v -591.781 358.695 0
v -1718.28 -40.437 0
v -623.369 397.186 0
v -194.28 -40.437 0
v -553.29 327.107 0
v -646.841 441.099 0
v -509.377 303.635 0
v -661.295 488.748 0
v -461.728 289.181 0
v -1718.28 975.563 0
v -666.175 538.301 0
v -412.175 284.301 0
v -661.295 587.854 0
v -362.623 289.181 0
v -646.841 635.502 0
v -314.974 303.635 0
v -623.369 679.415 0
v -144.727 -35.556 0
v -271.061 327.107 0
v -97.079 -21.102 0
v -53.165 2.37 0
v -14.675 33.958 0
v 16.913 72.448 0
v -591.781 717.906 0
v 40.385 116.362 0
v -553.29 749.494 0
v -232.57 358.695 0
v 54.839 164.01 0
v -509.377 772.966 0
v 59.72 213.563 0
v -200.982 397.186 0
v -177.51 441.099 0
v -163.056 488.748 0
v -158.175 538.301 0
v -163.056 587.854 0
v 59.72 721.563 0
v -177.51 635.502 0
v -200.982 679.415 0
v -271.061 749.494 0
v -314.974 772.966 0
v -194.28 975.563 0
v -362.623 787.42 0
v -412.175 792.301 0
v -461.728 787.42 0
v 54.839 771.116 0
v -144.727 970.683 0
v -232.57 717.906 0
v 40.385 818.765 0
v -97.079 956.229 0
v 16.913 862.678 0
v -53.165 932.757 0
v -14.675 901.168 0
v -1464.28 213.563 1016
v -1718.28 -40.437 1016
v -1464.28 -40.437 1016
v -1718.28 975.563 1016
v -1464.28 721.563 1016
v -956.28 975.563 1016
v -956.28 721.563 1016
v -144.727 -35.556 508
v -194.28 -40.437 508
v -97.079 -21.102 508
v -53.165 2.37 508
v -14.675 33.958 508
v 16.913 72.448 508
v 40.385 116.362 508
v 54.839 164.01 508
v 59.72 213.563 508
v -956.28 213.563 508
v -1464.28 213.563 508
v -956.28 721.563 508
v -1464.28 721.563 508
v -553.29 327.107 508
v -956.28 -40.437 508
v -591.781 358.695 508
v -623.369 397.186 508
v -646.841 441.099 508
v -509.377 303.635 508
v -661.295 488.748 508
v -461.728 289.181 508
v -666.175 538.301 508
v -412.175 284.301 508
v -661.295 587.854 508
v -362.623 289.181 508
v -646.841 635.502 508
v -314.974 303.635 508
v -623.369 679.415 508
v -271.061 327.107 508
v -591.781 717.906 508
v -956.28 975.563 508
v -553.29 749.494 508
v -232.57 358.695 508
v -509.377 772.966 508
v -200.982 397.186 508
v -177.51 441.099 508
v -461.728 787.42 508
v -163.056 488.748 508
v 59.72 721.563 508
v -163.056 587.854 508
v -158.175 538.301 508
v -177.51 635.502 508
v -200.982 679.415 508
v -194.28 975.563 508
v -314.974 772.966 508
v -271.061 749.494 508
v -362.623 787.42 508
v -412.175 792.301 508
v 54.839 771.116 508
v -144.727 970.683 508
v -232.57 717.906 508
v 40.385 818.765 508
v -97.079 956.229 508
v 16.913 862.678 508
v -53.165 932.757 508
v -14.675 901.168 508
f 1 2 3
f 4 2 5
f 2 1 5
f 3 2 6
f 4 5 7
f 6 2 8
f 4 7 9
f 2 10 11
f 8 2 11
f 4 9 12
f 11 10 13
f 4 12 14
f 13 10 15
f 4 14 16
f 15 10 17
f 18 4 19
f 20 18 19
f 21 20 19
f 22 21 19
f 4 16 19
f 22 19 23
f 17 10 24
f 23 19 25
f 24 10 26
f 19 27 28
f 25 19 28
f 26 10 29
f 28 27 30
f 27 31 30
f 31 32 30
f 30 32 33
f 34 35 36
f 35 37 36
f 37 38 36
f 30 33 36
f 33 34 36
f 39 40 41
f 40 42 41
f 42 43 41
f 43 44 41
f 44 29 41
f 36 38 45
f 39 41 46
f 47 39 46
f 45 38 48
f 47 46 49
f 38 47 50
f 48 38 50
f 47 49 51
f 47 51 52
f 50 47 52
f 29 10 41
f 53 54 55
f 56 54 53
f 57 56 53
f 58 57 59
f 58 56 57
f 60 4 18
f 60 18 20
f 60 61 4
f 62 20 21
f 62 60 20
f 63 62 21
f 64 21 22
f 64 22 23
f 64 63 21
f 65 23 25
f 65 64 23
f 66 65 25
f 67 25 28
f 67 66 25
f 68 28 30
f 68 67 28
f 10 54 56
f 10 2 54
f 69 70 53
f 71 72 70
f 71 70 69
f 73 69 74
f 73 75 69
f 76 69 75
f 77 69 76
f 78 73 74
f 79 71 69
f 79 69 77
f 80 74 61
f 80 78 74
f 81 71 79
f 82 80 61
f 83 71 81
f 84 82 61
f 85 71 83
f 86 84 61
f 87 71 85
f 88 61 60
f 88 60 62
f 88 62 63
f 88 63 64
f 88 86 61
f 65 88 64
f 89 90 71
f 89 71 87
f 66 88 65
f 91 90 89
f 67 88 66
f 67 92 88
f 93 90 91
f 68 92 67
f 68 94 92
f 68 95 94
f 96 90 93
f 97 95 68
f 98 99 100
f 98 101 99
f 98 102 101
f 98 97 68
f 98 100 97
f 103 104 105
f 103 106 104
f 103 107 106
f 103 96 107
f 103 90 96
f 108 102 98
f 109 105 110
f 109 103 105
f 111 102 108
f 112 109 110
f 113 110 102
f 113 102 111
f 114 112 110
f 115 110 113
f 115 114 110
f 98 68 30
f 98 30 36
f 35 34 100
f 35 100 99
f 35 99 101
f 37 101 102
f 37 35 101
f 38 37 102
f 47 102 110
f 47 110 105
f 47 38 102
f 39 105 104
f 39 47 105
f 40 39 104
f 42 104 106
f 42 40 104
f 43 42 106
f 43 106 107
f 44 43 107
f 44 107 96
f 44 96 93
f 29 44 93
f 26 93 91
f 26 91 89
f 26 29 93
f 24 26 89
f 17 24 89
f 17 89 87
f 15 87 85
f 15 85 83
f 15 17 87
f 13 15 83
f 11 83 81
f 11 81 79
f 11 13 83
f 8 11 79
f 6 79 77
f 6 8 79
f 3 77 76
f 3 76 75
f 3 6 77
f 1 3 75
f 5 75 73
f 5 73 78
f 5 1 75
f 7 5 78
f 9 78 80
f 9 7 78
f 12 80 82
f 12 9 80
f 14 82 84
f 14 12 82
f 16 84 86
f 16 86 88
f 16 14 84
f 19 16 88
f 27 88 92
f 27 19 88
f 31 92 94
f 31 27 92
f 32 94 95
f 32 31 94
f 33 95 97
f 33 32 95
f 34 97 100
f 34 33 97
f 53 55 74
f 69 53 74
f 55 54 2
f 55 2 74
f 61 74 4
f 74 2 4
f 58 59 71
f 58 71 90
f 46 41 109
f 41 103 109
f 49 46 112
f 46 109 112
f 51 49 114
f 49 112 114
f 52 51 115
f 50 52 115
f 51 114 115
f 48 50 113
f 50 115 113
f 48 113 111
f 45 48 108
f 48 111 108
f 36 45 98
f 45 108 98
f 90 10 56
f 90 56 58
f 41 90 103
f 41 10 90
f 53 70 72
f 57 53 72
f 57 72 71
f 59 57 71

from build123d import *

# Parameters (mm, degrees)
F0_W      = 1778
F0_H      = 1016
F0_R      = 254
F1_DEPTH  = 508
F2_R      = 254
F3_W      = 254
F3_H      = 1016
F4_DEPTH  = 508
F5_W      = 508
F5_H      = 254
F6_DEPTH  = 508
F7_W      = 508
F7_H      = 254
F8_DEPTH  = 508
F10_DEPTH = 254


with BuildPart() as f1:
    # F0 (on Top) → F1 (new body)
    with BuildSketch(Plane.XY):
        with Locations((-829.280311, 467.563289)):
            Rectangle(F0_W, F0_H)
        with Locations((-412.175477, 538.300574)):
            Circle(F0_R, mode=Mode.SUBTRACT)
    extrude(amount=F1_DEPTH)

    # F2
    f2_edges = [f1.edges().sort_by_distance(p)[0] for p in [
        (59.719689, -40.436711, 254),
        (59.719689, 975.563289, 254),
    ]]
    fillet(f2_edges, radius=F2_R)

    # F3 (on face) → F4 (join)
    with BuildSketch(Plane.XY.offset(508)):
        with Locations((-1591.280311, 467.563289)):
            Rectangle(F3_W, F3_H)
    extrude(amount=F4_DEPTH)

    # F5 (on face) → F6 (join)
    with BuildSketch(Plane.XY.offset(508)):
        with Locations((-1210.280311, 848.563289)):
            Rectangle(F5_W, F5_H)
    extrude(amount=F6_DEPTH)

    # F7 (on face) → F8 (join)
    with BuildSketch(Plane.XY.offset(508)):
        with Locations((-1210.280311, 86.563289)):
            Rectangle(F7_W, F7_H)
    extrude(amount=F8_DEPTH)

    # F9 (on face) → F10 (cut)
    with BuildSketch(Plane.XZ.offset(40.436711)):
        Polygon((-1464.280311, 1016), (-956.280311, 508), (-956.280311, 1016), align=None)
    extrude(amount=-F10_DEPTH, mode=Mode.SUBTRACT)


solid = f1.part
